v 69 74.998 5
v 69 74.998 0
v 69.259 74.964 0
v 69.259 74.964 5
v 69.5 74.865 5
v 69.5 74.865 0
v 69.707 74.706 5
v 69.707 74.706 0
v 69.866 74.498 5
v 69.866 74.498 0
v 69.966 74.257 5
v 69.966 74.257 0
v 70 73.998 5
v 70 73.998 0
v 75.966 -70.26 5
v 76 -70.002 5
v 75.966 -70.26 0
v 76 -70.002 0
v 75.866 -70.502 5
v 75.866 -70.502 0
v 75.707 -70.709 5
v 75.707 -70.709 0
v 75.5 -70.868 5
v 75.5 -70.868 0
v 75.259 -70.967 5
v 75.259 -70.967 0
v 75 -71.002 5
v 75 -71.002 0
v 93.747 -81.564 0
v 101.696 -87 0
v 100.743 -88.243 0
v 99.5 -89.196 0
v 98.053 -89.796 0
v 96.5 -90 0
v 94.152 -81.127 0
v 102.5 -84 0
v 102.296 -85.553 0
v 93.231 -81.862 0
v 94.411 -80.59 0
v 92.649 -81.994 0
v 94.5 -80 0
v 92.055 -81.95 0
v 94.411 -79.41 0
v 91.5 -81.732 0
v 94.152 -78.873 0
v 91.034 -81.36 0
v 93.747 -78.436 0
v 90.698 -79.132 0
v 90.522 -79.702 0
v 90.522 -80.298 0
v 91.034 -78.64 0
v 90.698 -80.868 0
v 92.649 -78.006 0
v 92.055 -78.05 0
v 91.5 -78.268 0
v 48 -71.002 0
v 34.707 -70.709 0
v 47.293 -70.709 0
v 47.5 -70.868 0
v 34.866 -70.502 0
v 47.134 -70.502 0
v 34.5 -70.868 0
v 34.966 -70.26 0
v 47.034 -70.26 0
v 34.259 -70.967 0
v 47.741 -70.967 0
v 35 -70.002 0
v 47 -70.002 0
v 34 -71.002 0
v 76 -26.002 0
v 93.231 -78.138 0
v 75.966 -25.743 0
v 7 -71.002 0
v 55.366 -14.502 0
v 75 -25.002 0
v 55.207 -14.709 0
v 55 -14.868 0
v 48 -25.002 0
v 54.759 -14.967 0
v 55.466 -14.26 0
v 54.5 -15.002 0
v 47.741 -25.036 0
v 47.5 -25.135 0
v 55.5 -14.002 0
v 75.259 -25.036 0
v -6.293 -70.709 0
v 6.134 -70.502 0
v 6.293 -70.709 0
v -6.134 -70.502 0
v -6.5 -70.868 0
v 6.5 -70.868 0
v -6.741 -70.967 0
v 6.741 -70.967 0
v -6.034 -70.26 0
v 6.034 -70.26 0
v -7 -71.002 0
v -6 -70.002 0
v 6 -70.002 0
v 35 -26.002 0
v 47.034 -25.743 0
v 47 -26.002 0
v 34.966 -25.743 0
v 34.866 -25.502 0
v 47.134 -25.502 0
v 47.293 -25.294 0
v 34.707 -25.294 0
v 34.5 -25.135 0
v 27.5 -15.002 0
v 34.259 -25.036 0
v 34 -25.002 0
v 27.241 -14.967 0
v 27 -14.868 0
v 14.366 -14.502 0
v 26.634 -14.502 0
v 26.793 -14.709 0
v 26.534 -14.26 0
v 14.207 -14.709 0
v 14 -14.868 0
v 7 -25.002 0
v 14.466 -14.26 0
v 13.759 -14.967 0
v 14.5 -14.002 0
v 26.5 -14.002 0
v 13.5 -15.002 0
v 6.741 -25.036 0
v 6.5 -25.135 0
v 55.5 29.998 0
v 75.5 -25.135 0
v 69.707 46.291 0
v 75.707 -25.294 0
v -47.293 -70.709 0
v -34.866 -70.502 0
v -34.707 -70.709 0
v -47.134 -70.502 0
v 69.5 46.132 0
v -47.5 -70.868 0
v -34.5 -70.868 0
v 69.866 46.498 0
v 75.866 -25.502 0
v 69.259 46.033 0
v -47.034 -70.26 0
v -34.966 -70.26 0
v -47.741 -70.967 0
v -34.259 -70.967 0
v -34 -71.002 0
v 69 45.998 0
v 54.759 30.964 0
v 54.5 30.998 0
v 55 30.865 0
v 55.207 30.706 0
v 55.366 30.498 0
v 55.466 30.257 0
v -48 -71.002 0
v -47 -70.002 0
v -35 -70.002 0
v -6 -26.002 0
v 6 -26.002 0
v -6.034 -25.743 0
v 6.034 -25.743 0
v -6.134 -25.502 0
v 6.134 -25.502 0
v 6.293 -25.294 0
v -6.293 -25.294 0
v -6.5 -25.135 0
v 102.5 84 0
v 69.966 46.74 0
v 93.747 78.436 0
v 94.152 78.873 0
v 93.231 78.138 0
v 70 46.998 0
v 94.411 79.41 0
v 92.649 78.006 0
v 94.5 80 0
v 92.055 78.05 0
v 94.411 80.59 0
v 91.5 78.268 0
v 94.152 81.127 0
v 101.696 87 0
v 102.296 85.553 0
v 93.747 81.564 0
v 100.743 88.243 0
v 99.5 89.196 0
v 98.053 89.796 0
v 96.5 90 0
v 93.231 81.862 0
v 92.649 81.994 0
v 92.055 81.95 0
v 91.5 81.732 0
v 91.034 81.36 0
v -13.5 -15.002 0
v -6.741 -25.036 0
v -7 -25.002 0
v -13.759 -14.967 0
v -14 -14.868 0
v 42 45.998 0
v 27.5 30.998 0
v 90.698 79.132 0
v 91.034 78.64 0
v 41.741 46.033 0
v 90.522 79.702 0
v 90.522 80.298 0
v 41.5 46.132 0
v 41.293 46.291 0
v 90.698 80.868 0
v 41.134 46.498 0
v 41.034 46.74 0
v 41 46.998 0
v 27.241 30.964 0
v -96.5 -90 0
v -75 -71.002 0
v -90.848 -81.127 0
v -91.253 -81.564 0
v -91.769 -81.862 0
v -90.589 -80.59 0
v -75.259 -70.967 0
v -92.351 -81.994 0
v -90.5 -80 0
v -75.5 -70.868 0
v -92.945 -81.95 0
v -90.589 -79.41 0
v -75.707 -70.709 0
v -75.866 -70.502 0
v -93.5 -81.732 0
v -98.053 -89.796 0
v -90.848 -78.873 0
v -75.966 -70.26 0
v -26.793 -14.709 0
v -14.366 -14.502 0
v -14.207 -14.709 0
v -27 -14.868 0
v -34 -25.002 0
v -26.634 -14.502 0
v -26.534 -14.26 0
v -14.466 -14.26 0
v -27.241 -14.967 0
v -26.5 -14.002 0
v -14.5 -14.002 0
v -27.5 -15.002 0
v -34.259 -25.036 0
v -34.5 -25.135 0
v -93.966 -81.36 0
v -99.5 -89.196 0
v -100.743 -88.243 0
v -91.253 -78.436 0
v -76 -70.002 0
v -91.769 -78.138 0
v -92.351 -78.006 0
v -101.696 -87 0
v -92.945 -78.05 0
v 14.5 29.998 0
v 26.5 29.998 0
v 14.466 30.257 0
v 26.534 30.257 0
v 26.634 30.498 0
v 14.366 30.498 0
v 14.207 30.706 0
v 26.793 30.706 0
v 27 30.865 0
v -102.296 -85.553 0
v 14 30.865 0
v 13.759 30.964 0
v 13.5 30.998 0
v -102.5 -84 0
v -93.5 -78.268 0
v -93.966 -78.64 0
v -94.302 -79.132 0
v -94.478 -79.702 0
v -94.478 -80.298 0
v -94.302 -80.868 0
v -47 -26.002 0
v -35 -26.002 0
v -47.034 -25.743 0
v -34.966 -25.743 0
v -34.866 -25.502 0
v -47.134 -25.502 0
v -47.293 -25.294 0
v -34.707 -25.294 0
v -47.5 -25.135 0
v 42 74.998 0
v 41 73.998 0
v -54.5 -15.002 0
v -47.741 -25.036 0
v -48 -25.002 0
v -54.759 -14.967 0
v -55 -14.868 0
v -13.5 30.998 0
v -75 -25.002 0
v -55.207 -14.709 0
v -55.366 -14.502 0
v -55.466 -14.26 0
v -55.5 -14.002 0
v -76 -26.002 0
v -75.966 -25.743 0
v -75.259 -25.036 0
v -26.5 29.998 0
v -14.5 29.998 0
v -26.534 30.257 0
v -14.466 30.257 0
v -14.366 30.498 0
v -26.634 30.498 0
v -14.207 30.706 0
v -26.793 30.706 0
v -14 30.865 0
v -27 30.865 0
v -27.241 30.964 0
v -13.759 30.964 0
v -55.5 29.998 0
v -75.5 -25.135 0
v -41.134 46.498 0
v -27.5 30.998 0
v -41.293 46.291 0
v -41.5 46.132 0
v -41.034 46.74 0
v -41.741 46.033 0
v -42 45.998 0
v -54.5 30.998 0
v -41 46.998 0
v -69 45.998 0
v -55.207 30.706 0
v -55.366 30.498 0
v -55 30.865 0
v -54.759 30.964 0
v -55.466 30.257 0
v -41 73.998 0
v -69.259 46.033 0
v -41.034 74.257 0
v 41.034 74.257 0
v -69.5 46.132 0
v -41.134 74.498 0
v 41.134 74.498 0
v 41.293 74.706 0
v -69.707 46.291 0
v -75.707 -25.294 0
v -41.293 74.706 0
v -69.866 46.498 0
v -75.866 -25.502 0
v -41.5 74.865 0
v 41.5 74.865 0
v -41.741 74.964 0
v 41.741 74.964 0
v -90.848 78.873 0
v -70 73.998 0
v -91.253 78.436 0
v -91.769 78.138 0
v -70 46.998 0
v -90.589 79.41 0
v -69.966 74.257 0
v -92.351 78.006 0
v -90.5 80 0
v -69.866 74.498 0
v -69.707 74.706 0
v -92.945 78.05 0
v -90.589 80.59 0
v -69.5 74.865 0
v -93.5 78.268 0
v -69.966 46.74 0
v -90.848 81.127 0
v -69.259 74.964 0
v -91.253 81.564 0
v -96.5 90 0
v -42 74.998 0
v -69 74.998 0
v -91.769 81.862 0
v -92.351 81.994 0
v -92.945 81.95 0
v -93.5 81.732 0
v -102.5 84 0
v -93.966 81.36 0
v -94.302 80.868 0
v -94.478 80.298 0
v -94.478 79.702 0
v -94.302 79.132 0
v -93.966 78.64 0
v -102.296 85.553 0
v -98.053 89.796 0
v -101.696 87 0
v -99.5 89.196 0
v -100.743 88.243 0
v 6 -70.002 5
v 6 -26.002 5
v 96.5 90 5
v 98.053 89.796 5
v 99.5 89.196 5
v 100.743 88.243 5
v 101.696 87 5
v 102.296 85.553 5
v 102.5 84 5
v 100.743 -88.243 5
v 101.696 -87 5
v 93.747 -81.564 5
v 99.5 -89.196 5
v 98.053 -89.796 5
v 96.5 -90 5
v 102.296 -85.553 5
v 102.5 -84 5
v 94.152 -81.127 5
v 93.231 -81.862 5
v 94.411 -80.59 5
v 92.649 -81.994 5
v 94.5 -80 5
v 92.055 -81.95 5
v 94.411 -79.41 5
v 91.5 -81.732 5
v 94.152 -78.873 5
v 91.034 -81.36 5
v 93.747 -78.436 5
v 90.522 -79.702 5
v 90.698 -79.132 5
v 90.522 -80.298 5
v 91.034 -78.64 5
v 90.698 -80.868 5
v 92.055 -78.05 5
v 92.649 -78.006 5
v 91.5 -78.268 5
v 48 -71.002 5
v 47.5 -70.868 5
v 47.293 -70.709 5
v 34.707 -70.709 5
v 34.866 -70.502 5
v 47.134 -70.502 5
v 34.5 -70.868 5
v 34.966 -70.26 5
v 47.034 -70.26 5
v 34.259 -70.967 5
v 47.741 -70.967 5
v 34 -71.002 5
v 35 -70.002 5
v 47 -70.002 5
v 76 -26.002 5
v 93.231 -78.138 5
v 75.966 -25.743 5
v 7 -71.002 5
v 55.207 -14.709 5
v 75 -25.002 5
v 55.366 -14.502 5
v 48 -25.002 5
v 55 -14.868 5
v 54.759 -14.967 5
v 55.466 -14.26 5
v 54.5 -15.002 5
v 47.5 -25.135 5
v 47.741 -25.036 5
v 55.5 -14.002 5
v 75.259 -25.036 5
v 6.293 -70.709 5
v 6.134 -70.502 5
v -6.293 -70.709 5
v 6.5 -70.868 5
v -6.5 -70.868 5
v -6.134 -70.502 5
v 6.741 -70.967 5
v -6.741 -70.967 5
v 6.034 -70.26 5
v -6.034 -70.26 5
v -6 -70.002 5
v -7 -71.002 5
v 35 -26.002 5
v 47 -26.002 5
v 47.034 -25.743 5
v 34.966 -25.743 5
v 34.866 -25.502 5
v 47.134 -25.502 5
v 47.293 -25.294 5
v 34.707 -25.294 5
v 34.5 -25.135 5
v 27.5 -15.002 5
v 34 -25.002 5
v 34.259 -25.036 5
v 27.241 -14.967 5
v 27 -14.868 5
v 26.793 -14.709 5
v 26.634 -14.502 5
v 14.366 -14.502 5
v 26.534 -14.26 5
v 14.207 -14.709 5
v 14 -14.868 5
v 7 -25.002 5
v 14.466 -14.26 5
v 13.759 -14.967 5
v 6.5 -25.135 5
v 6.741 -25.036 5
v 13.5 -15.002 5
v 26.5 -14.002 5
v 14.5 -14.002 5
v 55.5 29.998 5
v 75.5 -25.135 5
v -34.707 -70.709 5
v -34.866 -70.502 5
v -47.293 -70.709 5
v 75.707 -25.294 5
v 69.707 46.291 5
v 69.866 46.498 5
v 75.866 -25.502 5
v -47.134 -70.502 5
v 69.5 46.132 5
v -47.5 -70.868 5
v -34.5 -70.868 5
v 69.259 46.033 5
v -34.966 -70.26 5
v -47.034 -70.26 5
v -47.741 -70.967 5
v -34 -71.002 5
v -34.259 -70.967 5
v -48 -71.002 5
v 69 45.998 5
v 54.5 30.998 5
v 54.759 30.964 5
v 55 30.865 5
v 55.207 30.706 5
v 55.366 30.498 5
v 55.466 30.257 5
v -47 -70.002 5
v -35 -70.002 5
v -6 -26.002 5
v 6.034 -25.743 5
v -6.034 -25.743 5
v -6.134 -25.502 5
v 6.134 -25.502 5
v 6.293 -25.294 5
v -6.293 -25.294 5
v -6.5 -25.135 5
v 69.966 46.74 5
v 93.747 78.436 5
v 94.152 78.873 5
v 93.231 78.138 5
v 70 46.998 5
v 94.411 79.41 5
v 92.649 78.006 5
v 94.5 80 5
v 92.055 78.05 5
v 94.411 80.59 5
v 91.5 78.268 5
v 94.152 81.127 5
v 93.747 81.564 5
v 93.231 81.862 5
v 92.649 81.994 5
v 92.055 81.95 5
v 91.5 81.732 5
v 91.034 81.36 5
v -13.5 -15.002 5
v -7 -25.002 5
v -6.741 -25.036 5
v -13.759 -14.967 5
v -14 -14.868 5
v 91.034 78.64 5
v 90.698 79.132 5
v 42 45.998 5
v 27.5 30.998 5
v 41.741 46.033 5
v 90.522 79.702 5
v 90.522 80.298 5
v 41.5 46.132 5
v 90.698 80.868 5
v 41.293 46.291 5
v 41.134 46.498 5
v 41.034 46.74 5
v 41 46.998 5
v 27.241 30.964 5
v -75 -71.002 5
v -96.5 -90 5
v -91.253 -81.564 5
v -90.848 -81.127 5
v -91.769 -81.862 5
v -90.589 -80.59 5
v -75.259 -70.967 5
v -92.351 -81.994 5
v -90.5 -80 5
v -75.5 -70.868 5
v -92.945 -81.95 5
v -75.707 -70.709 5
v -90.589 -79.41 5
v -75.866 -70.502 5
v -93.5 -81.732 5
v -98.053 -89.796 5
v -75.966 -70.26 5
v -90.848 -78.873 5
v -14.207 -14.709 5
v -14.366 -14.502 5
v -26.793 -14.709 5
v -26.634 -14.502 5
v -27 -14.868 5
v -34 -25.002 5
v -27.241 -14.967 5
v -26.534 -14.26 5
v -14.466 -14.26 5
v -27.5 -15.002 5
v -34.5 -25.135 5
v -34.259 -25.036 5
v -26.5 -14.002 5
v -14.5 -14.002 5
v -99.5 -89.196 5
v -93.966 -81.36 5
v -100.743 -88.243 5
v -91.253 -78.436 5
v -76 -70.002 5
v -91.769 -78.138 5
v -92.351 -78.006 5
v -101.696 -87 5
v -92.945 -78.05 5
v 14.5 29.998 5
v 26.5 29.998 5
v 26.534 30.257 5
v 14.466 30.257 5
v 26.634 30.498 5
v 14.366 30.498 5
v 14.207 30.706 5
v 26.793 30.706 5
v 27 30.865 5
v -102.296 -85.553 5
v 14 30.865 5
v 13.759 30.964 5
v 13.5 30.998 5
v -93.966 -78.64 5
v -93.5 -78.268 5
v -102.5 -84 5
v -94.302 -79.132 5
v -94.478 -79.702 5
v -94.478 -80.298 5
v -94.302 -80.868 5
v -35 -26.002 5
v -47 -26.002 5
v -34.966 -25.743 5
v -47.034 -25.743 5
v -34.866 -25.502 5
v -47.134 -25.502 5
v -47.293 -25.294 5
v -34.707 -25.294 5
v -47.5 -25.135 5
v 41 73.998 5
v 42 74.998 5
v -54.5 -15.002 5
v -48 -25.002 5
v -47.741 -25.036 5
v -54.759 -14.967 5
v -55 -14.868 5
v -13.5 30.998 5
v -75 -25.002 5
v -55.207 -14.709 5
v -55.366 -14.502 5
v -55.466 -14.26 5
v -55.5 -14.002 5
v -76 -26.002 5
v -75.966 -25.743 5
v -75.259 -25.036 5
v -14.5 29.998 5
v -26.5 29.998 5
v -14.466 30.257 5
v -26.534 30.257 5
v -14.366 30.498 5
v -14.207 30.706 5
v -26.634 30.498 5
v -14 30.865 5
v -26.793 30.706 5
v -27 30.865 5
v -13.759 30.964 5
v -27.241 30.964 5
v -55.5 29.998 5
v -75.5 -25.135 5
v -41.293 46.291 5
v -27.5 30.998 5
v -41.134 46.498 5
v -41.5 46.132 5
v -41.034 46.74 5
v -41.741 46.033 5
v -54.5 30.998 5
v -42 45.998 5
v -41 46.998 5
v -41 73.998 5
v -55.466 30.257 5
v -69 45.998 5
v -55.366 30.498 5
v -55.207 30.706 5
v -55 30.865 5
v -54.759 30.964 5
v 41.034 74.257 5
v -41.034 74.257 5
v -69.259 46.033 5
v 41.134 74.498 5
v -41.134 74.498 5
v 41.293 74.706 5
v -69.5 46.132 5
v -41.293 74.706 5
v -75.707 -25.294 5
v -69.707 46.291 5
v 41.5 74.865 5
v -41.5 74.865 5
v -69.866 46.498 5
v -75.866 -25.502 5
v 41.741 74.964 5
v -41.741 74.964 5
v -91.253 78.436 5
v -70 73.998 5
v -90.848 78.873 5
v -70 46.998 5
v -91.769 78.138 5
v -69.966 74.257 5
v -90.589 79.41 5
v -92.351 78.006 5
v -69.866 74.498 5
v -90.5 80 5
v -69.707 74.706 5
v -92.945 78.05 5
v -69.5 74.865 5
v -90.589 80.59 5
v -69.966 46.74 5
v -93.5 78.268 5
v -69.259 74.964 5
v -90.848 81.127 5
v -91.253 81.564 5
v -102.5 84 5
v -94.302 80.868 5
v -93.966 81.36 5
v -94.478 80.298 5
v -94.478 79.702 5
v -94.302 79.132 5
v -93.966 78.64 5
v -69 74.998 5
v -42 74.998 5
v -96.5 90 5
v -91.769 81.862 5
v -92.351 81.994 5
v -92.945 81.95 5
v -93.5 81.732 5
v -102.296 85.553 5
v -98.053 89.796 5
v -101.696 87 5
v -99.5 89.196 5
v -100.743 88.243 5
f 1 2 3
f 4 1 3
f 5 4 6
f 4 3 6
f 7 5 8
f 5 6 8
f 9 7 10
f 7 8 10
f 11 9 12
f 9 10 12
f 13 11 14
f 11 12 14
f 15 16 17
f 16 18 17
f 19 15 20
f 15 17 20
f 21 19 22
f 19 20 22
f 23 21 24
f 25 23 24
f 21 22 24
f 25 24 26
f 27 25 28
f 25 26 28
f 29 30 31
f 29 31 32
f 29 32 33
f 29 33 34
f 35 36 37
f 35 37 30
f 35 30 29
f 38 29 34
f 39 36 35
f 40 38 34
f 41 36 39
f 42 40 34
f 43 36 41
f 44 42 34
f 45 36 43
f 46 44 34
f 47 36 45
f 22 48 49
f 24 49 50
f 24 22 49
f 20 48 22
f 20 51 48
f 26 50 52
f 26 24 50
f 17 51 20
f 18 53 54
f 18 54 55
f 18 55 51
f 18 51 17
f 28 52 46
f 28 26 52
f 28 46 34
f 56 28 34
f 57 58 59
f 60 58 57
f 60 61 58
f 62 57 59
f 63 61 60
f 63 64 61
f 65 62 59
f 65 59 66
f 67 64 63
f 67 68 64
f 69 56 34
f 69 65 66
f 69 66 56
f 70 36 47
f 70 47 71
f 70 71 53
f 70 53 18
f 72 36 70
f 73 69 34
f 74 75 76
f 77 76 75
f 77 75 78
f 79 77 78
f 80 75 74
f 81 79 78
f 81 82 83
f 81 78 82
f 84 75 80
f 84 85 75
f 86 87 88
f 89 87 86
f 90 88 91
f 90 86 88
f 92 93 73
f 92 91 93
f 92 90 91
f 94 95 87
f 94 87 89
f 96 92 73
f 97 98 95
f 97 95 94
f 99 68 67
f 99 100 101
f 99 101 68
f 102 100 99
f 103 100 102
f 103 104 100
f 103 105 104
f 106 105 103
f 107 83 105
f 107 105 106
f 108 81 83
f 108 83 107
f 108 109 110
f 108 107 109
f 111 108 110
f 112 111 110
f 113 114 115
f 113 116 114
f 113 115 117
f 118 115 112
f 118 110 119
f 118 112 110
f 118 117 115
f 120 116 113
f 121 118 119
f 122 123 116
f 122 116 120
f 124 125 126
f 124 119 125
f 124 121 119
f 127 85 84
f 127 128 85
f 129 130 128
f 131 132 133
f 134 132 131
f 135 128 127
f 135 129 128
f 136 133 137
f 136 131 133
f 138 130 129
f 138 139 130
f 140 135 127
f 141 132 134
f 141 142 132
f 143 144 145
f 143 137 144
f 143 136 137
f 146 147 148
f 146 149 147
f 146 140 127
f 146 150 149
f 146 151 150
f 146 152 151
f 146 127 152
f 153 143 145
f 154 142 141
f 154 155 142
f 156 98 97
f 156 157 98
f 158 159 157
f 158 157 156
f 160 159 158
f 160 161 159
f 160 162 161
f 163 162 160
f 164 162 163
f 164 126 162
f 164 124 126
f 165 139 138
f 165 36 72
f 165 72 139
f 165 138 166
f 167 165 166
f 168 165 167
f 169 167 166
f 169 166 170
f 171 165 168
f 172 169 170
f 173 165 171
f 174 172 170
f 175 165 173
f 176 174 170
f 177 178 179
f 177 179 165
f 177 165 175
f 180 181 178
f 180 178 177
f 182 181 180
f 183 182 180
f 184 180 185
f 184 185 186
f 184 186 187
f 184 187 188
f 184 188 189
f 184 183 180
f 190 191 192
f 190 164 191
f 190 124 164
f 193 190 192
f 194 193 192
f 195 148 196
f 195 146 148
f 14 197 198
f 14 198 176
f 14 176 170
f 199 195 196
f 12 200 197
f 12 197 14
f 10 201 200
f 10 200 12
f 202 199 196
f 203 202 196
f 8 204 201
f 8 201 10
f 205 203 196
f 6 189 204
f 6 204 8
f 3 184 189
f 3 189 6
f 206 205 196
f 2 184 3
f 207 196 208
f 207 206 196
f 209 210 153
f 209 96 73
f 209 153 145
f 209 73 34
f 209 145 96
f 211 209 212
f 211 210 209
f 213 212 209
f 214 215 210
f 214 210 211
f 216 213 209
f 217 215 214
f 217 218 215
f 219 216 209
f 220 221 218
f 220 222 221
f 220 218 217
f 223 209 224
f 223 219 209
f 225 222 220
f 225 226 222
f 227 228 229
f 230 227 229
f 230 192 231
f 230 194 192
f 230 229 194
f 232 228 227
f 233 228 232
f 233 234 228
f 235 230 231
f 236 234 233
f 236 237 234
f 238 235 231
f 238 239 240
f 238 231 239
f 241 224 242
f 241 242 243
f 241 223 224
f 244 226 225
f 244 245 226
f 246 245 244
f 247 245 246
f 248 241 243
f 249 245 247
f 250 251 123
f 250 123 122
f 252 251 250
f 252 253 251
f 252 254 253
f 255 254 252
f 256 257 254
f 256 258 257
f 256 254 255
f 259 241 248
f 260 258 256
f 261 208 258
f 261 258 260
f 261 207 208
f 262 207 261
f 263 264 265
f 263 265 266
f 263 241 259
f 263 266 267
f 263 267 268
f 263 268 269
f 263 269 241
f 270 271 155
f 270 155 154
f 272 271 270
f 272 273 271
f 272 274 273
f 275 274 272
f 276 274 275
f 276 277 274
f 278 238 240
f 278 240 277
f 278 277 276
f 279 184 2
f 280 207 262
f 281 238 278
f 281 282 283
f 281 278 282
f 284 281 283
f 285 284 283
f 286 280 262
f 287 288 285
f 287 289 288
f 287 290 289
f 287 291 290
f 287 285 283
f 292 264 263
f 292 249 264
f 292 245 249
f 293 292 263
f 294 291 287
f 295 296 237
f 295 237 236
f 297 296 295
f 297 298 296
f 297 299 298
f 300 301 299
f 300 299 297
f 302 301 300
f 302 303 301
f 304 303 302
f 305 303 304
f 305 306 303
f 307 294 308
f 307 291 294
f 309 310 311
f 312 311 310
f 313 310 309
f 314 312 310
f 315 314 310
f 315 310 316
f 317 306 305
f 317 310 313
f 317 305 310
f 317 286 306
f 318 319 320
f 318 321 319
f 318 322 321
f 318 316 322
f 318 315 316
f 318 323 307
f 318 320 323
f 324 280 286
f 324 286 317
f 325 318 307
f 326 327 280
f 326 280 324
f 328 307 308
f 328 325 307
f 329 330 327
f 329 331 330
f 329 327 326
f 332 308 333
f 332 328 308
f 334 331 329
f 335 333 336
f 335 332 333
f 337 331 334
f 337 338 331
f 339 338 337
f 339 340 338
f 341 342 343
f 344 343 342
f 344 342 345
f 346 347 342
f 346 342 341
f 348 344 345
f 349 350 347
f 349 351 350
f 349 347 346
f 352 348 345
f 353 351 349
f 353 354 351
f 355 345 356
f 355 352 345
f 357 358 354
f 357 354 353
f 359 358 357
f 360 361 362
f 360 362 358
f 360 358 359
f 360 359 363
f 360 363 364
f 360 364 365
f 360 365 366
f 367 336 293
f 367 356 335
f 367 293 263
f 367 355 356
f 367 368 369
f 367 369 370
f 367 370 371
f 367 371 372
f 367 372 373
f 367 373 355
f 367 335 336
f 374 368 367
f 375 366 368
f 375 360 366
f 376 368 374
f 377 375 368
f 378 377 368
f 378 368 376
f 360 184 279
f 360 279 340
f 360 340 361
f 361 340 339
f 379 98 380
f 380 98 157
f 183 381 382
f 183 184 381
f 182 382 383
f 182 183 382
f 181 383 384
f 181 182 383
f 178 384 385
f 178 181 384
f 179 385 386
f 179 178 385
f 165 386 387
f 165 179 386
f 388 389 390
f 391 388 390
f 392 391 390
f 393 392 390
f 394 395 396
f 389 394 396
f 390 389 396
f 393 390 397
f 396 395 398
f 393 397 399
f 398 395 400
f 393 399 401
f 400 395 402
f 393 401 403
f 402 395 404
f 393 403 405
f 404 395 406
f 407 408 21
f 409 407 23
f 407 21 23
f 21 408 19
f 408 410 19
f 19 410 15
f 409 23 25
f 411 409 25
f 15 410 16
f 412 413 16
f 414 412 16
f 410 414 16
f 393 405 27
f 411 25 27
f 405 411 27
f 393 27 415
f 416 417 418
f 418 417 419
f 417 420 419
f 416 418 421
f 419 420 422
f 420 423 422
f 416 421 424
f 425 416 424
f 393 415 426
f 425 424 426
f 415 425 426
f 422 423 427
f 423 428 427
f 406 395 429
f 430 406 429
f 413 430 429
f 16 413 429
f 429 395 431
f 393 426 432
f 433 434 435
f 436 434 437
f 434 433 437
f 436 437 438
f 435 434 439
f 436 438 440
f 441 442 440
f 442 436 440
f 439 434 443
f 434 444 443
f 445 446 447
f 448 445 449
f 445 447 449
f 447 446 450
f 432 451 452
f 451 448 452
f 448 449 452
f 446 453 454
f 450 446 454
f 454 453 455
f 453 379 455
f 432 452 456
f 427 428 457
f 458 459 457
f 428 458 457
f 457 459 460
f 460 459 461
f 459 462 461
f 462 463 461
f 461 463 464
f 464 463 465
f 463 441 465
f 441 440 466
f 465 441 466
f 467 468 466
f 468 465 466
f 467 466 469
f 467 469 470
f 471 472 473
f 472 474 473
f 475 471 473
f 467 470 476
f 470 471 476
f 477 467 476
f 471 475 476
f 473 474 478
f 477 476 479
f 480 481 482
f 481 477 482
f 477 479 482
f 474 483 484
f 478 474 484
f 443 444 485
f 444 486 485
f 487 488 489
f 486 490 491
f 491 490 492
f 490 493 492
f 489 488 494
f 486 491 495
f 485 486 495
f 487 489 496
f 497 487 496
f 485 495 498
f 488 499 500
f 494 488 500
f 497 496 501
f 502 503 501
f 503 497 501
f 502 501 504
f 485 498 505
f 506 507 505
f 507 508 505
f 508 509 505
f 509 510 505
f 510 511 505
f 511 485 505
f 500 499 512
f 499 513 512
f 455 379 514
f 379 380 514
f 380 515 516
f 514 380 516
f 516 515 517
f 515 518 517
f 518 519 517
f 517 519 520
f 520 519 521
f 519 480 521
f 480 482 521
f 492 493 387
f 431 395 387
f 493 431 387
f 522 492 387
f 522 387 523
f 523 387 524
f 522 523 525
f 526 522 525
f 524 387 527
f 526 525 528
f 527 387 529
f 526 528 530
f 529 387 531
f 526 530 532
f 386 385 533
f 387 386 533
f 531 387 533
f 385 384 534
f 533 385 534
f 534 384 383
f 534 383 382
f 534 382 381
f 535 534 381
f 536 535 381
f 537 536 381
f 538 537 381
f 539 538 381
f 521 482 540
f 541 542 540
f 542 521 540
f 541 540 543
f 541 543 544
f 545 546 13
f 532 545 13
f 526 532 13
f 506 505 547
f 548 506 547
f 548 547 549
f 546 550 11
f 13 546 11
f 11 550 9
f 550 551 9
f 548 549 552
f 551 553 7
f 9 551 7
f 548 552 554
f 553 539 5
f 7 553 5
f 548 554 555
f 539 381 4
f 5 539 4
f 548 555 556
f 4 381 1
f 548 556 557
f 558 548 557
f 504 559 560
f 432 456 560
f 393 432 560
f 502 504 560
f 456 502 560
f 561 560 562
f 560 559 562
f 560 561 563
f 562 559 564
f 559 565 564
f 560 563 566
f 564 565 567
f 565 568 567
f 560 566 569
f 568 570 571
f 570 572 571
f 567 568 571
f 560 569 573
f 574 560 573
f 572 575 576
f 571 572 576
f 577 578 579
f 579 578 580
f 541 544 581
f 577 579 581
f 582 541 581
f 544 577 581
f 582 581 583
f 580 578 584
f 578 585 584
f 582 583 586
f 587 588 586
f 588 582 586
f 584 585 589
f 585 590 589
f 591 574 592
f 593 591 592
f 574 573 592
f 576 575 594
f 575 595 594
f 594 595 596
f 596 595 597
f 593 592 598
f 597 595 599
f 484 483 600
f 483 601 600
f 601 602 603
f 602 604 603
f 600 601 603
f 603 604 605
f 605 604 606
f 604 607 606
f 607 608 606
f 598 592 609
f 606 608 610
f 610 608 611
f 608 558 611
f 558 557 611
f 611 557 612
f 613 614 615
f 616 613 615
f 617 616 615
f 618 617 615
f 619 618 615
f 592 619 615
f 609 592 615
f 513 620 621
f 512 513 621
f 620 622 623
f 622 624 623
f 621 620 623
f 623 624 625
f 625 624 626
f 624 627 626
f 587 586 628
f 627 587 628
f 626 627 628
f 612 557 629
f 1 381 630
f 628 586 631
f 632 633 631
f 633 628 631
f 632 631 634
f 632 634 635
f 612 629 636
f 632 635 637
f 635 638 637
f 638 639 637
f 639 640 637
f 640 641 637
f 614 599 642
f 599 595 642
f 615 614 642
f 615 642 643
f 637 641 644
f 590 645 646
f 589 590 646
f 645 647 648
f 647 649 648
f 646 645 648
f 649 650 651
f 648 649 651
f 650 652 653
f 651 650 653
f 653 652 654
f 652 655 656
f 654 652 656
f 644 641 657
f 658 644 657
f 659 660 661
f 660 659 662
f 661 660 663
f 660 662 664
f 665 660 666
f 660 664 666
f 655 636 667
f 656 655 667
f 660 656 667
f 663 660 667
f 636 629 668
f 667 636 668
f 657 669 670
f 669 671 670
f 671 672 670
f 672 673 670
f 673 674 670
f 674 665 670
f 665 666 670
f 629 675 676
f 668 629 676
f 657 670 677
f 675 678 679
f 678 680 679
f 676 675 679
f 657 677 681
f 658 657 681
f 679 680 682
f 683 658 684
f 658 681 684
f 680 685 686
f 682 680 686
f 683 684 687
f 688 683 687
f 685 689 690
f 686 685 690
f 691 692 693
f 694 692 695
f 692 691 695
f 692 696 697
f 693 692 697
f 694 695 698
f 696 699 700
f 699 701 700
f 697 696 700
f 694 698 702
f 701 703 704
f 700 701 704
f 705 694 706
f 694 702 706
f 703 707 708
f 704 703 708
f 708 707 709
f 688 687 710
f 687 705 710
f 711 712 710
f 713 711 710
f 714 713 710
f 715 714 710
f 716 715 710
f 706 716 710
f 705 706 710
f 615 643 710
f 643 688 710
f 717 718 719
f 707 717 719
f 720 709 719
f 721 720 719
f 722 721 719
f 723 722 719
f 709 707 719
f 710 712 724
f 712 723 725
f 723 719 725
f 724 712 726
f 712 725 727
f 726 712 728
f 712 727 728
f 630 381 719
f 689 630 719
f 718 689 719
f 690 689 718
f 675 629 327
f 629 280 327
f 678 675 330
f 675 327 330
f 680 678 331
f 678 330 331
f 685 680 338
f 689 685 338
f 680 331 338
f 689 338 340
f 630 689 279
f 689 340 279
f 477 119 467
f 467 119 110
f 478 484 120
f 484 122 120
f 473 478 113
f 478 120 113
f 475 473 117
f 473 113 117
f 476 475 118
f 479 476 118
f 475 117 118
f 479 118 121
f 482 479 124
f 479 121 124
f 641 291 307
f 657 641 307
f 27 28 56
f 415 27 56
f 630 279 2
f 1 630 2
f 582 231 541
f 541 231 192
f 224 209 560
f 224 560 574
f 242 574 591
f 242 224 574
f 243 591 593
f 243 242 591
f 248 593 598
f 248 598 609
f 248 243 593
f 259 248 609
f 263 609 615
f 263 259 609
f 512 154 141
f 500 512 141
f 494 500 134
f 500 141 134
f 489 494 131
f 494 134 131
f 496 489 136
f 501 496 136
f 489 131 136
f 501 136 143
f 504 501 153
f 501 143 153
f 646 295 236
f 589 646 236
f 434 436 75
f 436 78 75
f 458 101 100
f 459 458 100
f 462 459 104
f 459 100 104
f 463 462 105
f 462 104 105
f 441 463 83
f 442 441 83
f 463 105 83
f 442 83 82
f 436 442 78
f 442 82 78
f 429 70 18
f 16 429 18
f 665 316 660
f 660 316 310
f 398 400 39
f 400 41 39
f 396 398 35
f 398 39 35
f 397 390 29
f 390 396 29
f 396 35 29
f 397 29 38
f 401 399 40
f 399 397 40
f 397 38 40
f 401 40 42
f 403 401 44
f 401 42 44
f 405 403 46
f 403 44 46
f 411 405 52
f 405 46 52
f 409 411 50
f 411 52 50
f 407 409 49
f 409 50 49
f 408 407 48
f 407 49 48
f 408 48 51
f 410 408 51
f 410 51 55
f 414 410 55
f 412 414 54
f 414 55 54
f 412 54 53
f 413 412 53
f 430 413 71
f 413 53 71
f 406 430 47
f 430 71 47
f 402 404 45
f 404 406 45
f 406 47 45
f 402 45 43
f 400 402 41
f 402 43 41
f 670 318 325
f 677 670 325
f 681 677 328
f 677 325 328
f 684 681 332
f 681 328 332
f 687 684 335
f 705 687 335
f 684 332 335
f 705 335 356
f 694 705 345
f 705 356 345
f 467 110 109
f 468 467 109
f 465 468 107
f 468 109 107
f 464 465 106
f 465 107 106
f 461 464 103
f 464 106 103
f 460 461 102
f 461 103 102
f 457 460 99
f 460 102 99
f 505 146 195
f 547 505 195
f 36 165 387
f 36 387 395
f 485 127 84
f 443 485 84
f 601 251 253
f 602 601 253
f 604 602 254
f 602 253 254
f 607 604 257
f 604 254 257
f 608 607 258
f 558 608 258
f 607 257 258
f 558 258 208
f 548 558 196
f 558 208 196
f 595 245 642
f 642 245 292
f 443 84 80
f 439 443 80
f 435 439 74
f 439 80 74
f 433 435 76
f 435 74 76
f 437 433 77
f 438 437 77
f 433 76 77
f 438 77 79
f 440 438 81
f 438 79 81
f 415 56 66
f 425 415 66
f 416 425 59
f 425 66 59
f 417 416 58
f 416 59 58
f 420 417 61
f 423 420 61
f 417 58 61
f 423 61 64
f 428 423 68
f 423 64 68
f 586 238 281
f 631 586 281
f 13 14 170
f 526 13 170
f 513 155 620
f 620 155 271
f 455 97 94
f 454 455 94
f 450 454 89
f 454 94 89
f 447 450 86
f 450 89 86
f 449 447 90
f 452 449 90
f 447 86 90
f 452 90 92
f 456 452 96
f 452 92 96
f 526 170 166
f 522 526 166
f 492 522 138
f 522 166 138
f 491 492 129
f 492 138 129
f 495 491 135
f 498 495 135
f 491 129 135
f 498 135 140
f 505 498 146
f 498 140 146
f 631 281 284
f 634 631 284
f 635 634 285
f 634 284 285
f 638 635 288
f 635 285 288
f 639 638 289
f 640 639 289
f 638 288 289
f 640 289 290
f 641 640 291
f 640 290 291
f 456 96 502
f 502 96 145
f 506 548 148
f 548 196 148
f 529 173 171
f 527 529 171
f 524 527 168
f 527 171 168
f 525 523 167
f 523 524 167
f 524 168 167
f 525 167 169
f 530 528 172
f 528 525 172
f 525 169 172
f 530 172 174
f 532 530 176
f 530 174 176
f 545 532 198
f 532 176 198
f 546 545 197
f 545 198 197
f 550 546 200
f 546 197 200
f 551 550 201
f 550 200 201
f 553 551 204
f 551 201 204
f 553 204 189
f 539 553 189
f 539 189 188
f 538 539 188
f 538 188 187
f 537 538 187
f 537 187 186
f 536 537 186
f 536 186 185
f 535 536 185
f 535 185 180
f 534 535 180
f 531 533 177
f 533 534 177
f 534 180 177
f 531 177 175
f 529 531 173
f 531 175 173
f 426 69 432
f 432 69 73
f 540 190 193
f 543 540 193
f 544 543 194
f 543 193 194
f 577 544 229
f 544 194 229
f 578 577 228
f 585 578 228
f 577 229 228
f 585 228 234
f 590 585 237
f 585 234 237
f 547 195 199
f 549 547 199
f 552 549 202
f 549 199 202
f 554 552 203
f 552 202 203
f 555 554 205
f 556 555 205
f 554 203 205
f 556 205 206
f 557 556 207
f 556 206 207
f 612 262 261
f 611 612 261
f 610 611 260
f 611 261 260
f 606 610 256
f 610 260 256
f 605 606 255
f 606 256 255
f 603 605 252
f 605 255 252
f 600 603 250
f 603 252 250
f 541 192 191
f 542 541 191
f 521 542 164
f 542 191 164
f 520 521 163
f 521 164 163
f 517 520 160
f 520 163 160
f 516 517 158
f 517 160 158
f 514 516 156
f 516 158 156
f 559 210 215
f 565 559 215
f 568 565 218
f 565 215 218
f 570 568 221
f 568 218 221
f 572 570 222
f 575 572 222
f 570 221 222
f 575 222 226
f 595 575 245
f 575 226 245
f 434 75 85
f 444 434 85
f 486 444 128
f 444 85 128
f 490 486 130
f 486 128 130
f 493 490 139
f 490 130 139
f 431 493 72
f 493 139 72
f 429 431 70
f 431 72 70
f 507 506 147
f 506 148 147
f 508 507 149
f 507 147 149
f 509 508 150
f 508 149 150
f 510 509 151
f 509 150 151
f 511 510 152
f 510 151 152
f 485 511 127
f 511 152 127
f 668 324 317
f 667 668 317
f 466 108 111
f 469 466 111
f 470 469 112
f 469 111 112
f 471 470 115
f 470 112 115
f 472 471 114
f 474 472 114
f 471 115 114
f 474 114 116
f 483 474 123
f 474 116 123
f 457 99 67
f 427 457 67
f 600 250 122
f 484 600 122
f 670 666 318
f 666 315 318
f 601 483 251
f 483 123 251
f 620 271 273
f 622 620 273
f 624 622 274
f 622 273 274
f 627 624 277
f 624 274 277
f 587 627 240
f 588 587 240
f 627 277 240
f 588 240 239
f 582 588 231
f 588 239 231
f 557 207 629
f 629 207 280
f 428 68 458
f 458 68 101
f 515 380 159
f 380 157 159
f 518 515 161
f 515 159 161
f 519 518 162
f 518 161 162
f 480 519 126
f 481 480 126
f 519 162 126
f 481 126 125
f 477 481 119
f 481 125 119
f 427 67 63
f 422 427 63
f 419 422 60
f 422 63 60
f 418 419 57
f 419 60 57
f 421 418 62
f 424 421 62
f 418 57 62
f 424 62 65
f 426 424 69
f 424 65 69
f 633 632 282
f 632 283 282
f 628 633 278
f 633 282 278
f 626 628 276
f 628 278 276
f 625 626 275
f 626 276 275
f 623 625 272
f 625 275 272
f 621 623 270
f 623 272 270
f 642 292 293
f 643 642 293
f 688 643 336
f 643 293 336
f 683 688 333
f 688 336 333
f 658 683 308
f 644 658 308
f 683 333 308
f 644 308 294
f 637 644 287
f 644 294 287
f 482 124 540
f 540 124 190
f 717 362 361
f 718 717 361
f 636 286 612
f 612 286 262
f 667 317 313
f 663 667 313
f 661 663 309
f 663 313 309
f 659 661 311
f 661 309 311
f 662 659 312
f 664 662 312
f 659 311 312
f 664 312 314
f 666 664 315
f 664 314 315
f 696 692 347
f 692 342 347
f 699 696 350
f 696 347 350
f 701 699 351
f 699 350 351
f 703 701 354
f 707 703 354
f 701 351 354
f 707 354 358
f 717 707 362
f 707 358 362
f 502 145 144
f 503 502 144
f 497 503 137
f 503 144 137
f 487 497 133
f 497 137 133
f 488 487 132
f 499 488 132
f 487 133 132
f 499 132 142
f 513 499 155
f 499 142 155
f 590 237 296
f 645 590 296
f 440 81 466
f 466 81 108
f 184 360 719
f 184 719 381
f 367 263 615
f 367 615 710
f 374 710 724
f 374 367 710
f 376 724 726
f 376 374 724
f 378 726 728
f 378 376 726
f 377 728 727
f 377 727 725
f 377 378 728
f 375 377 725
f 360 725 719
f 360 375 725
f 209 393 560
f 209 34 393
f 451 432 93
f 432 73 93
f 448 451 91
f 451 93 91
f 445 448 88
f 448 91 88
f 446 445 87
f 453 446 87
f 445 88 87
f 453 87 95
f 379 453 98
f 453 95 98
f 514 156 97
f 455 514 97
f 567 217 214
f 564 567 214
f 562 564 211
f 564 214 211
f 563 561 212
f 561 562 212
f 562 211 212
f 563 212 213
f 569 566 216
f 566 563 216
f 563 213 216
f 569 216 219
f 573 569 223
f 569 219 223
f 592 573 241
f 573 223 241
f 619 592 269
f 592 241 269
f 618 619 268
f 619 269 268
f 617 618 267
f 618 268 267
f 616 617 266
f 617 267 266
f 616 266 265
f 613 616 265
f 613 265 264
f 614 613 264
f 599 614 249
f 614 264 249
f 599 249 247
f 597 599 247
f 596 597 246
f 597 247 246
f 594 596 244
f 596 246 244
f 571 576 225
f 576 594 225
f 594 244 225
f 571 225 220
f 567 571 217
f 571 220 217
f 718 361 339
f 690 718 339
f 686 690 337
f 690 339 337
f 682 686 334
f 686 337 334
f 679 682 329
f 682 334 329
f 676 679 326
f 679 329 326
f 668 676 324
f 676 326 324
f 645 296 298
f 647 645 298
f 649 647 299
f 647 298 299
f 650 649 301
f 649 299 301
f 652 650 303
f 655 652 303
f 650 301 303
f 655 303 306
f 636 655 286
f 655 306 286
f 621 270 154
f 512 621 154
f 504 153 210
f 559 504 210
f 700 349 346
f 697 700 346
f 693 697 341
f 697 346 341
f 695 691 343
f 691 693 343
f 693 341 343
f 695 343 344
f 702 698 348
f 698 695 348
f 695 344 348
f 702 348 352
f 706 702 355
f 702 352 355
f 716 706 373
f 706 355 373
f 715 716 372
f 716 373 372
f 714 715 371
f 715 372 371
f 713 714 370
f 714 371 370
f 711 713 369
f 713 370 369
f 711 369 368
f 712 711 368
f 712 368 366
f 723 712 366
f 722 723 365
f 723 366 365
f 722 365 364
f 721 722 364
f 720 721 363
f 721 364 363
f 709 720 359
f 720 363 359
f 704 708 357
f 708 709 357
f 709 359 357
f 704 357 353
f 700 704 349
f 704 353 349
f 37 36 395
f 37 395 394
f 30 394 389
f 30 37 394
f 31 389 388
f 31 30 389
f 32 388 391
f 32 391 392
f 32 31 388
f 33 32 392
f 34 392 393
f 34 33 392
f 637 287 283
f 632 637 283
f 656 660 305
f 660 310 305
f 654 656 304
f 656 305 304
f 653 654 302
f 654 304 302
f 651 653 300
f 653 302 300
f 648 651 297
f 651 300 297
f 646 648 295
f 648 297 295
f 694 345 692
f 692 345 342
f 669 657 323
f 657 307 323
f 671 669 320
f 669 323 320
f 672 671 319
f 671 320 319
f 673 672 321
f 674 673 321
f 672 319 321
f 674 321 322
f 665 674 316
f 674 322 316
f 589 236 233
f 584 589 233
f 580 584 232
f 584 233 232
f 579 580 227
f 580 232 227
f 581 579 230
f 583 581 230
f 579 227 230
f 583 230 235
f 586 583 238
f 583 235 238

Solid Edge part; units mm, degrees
sketch "Sketch1" plane through (0, 0, 0) normal (0, 0, 1) x (1, 0, 0)
  circle A0 centre (92.5, 80) radius 2
  circle A1 centre (-92.5, 80) radius 2
  circle A2 centre (-92.5, -80) radius 2
  arc A3 (-48, -25.0015) -> (-47, -26.0015) centre (-48, -26.0015) cw
  line L0 (-47, -26.0015) -> (-47, -70.0015)
  arc A4 (-47, -70.0015) -> (-48, -71.0015) centre (-48, -70.0015) cw
  line L1 (-48, -71.0015) -> (-75, -71.0015)
  arc A5 (-75, -71.0015) -> (-76, -70.0015) centre (-75, -70.0015) cw
  line L2 (-76, -70.0015) -> (-76, -26.0015)
  arc A6 (-76, -26.0015) -> (-75, -25.0015) centre (-75, -26.0015) cw
  line L3 (-75, -25.0015) -> (-48, -25.0015)
  arc A7 (-7, -25.0015) -> (-6, -26.0015) centre (-7, -26.0015) cw
  line L4 (-6, -26.0015) -> (-6, -70.0015)
  arc A8 (-6, -70.0015) -> (-7, -71.0015) centre (-7, -70.0015) cw
  line L5 (-7, -71.0015) -> (-34, -71.0015)
  arc A9 (-34, -71.0015) -> (-35, -70.0015) centre (-34, -70.0015) cw
  line L6 (-35, -70.0015) -> (-35, -26.0015)
  arc A10 (-35, -26.0015) -> (-34, -25.0015) centre (-34, -26.0015) cw
  line L7 (-34, -25.0015) -> (-7, -25.0015)
  arc A11 (34, -25.0015) -> (35, -26.0015) centre (34, -26.0015) cw
  line L8 (35, -26.0015) -> (35, -70.0015)
  arc A12 (35, -70.0015) -> (34, -71.0015) centre (34, -70.0015) cw
  line L9 (34, -71.0015) -> (7, -71.0015)
  arc A13 (7, -71.0015) -> (6, -70.0015) centre (7, -70.0015) cw
  line L10 (6, -70.0015) -> (6, -26.0015)
  arc A14 (6, -26.0015) -> (7, -25.0015) centre (7, -26.0015) cw
  line L11 (7, -25.0015) -> (34, -25.0015)
  arc A15 (75, -25.0015) -> (76, -26.0015) centre (75, -26.0015) cw
  line L12 (76, -26.0015) -> (76, -70.0015)
  arc A16 (76, -70.0015) -> (75, -71.0015) centre (75, -70.0015) cw
  line L13 (75, -71.0015) -> (48, -71.0015)
  arc A17 (48, -71.0015) -> (47, -70.0015) centre (48, -70.0015) cw
  line L14 (47, -70.0015) -> (47, -26.0015)
  arc A18 (47, -26.0015) -> (48, -25.0015) centre (48, -26.0015) cw
  line L15 (48, -25.0015) -> (75, -25.0015)
  arc A19 (54.5, 30.9985) -> (55.5, 29.9985) centre (54.5, 29.9985) cw
  line L16 (55.5, 29.9985) -> (55.5, -14.0015)
  arc A20 (55.5, -14.0015) -> (54.5, -15.0015) centre (54.5, -14.0015) cw
  line L17 (54.5, -15.0015) -> (27.5, -15.0015)
  arc A21 (27.5, -15.0015) -> (26.5, -14.0015) centre (27.5, -14.0015) cw
  line L18 (26.5, -14.0015) -> (26.5, 29.9985)
  arc A22 (26.5, 29.9985) -> (27.5, 30.9985) centre (27.5, 29.9985) cw
  line L19 (27.5, 30.9985) -> (54.5, 30.9985)
  arc A23 (13.5, 30.9985) -> (14.5, 29.9985) centre (13.5, 29.9985) cw
  line L20 (14.5, 29.9985) -> (14.5, -14.0015)
  arc A24 (14.5, -14.0015) -> (13.5, -15.0015) centre (13.5, -14.0015) cw
  line L21 (13.5, -15.0015) -> (-13.5, -15.0015)
  arc A25 (-13.5, -15.0015) -> (-14.5, -14.0015) centre (-13.5, -14.0015) cw
  line L22 (-14.5, -14.0015) -> (-14.5, 29.9985)
  arc A26 (-14.5, 29.9985) -> (-13.5, 30.9985) centre (-13.5, 29.9985) cw
  line L23 (-13.5, 30.9985) -> (13.5, 30.9985)
  arc A27 (69, 74.9985) -> (70, 73.9985) centre (69, 73.9985) cw
  line L24 (70, 73.9985) -> (70, 46.9985)
  arc A28 (70, 46.9985) -> (69, 45.9985) centre (69, 46.9985) cw
  line L25 (69, 45.9985) -> (42, 45.9985)
  arc A29 (42, 45.9985) -> (41, 46.9985) centre (42, 46.9985) cw
  line L26 (41, 46.9985) -> (41, 73.9985)
  arc A30 (41, 73.9985) -> (42, 74.9985) centre (42, 73.9985) cw
  line L27 (42, 74.9985) -> (69, 74.9985)
  arc A31 (96.5, 90) -> (102.5, 84) centre (96.5, 84) cw
  line L28 (102.5, 84) -> (102.5, -84)
  arc A32 (102.5, -84) -> (96.5, -90) centre (96.5, -84) cw
  line L29 (96.5, -90) -> (-96.5, -90)
  arc A33 (-96.5, -90) -> (-102.5, -84) centre (-96.5, -84) cw
  line L30 (-102.5, -84) -> (-102.5, 84)
  arc A34 (-102.5, 84) -> (-96.5, 90) centre (-96.5, 84) cw
  line L31 (-96.5, 90) -> (96.5, 90)
  arc A35 (-42, 74.9985) -> (-41, 73.9985) centre (-42, 73.9985) cw
  line L32 (-41, 73.9985) -> (-41, 46.9985)
  arc A36 (-41, 46.9985) -> (-42, 45.9985) centre (-42, 46.9985) cw
  line L33 (-42, 45.9985) -> (-69, 45.9985)
  arc A37 (-69, 45.9985) -> (-70, 46.9985) centre (-69, 46.9985) cw
  line L34 (-70, 46.9985) -> (-70, 73.9985)
  arc A38 (-70, 73.9985) -> (-69, 74.9985) centre (-69, 73.9985) cw
  line L35 (-69, 74.9985) -> (-42, 74.9985)
  arc A39 (-27.5, 30.9985) -> (-26.5, 29.9985) centre (-27.5, 29.9985) cw
  line L36 (-26.5, 29.9985) -> (-26.5, -14.0015)
  arc A40 (-26.5, -14.0015) -> (-27.5, -15.0015) centre (-27.5, -14.0015) cw
  line L37 (-27.5, -15.0015) -> (-54.5, -15.0015)
  arc A41 (-54.5, -15.0015) -> (-55.5, -14.0015) centre (-54.5, -14.0015) cw
  line L38 (-55.5, -14.0015) -> (-55.5, 29.9985)
  arc A42 (-55.5, 29.9985) -> (-54.5, 30.9985) centre (-54.5, 29.9985) cw
  line L39 (-54.5, 30.9985) -> (-27.5, 30.9985)
  circle A43 centre (92.5, -80) radius 2
  dimension "D1" = 6
  dimension "D2" = 205
  dimension "D3" = 180
  dimension "D4" = 10
  dimension "D5" = 10
  dimension "D6" = 10
  dimension "D7" = 10
  dimension "D8" = 4
extrude "Protrusion1" add sketch "Sketch1" along normal blind 5
